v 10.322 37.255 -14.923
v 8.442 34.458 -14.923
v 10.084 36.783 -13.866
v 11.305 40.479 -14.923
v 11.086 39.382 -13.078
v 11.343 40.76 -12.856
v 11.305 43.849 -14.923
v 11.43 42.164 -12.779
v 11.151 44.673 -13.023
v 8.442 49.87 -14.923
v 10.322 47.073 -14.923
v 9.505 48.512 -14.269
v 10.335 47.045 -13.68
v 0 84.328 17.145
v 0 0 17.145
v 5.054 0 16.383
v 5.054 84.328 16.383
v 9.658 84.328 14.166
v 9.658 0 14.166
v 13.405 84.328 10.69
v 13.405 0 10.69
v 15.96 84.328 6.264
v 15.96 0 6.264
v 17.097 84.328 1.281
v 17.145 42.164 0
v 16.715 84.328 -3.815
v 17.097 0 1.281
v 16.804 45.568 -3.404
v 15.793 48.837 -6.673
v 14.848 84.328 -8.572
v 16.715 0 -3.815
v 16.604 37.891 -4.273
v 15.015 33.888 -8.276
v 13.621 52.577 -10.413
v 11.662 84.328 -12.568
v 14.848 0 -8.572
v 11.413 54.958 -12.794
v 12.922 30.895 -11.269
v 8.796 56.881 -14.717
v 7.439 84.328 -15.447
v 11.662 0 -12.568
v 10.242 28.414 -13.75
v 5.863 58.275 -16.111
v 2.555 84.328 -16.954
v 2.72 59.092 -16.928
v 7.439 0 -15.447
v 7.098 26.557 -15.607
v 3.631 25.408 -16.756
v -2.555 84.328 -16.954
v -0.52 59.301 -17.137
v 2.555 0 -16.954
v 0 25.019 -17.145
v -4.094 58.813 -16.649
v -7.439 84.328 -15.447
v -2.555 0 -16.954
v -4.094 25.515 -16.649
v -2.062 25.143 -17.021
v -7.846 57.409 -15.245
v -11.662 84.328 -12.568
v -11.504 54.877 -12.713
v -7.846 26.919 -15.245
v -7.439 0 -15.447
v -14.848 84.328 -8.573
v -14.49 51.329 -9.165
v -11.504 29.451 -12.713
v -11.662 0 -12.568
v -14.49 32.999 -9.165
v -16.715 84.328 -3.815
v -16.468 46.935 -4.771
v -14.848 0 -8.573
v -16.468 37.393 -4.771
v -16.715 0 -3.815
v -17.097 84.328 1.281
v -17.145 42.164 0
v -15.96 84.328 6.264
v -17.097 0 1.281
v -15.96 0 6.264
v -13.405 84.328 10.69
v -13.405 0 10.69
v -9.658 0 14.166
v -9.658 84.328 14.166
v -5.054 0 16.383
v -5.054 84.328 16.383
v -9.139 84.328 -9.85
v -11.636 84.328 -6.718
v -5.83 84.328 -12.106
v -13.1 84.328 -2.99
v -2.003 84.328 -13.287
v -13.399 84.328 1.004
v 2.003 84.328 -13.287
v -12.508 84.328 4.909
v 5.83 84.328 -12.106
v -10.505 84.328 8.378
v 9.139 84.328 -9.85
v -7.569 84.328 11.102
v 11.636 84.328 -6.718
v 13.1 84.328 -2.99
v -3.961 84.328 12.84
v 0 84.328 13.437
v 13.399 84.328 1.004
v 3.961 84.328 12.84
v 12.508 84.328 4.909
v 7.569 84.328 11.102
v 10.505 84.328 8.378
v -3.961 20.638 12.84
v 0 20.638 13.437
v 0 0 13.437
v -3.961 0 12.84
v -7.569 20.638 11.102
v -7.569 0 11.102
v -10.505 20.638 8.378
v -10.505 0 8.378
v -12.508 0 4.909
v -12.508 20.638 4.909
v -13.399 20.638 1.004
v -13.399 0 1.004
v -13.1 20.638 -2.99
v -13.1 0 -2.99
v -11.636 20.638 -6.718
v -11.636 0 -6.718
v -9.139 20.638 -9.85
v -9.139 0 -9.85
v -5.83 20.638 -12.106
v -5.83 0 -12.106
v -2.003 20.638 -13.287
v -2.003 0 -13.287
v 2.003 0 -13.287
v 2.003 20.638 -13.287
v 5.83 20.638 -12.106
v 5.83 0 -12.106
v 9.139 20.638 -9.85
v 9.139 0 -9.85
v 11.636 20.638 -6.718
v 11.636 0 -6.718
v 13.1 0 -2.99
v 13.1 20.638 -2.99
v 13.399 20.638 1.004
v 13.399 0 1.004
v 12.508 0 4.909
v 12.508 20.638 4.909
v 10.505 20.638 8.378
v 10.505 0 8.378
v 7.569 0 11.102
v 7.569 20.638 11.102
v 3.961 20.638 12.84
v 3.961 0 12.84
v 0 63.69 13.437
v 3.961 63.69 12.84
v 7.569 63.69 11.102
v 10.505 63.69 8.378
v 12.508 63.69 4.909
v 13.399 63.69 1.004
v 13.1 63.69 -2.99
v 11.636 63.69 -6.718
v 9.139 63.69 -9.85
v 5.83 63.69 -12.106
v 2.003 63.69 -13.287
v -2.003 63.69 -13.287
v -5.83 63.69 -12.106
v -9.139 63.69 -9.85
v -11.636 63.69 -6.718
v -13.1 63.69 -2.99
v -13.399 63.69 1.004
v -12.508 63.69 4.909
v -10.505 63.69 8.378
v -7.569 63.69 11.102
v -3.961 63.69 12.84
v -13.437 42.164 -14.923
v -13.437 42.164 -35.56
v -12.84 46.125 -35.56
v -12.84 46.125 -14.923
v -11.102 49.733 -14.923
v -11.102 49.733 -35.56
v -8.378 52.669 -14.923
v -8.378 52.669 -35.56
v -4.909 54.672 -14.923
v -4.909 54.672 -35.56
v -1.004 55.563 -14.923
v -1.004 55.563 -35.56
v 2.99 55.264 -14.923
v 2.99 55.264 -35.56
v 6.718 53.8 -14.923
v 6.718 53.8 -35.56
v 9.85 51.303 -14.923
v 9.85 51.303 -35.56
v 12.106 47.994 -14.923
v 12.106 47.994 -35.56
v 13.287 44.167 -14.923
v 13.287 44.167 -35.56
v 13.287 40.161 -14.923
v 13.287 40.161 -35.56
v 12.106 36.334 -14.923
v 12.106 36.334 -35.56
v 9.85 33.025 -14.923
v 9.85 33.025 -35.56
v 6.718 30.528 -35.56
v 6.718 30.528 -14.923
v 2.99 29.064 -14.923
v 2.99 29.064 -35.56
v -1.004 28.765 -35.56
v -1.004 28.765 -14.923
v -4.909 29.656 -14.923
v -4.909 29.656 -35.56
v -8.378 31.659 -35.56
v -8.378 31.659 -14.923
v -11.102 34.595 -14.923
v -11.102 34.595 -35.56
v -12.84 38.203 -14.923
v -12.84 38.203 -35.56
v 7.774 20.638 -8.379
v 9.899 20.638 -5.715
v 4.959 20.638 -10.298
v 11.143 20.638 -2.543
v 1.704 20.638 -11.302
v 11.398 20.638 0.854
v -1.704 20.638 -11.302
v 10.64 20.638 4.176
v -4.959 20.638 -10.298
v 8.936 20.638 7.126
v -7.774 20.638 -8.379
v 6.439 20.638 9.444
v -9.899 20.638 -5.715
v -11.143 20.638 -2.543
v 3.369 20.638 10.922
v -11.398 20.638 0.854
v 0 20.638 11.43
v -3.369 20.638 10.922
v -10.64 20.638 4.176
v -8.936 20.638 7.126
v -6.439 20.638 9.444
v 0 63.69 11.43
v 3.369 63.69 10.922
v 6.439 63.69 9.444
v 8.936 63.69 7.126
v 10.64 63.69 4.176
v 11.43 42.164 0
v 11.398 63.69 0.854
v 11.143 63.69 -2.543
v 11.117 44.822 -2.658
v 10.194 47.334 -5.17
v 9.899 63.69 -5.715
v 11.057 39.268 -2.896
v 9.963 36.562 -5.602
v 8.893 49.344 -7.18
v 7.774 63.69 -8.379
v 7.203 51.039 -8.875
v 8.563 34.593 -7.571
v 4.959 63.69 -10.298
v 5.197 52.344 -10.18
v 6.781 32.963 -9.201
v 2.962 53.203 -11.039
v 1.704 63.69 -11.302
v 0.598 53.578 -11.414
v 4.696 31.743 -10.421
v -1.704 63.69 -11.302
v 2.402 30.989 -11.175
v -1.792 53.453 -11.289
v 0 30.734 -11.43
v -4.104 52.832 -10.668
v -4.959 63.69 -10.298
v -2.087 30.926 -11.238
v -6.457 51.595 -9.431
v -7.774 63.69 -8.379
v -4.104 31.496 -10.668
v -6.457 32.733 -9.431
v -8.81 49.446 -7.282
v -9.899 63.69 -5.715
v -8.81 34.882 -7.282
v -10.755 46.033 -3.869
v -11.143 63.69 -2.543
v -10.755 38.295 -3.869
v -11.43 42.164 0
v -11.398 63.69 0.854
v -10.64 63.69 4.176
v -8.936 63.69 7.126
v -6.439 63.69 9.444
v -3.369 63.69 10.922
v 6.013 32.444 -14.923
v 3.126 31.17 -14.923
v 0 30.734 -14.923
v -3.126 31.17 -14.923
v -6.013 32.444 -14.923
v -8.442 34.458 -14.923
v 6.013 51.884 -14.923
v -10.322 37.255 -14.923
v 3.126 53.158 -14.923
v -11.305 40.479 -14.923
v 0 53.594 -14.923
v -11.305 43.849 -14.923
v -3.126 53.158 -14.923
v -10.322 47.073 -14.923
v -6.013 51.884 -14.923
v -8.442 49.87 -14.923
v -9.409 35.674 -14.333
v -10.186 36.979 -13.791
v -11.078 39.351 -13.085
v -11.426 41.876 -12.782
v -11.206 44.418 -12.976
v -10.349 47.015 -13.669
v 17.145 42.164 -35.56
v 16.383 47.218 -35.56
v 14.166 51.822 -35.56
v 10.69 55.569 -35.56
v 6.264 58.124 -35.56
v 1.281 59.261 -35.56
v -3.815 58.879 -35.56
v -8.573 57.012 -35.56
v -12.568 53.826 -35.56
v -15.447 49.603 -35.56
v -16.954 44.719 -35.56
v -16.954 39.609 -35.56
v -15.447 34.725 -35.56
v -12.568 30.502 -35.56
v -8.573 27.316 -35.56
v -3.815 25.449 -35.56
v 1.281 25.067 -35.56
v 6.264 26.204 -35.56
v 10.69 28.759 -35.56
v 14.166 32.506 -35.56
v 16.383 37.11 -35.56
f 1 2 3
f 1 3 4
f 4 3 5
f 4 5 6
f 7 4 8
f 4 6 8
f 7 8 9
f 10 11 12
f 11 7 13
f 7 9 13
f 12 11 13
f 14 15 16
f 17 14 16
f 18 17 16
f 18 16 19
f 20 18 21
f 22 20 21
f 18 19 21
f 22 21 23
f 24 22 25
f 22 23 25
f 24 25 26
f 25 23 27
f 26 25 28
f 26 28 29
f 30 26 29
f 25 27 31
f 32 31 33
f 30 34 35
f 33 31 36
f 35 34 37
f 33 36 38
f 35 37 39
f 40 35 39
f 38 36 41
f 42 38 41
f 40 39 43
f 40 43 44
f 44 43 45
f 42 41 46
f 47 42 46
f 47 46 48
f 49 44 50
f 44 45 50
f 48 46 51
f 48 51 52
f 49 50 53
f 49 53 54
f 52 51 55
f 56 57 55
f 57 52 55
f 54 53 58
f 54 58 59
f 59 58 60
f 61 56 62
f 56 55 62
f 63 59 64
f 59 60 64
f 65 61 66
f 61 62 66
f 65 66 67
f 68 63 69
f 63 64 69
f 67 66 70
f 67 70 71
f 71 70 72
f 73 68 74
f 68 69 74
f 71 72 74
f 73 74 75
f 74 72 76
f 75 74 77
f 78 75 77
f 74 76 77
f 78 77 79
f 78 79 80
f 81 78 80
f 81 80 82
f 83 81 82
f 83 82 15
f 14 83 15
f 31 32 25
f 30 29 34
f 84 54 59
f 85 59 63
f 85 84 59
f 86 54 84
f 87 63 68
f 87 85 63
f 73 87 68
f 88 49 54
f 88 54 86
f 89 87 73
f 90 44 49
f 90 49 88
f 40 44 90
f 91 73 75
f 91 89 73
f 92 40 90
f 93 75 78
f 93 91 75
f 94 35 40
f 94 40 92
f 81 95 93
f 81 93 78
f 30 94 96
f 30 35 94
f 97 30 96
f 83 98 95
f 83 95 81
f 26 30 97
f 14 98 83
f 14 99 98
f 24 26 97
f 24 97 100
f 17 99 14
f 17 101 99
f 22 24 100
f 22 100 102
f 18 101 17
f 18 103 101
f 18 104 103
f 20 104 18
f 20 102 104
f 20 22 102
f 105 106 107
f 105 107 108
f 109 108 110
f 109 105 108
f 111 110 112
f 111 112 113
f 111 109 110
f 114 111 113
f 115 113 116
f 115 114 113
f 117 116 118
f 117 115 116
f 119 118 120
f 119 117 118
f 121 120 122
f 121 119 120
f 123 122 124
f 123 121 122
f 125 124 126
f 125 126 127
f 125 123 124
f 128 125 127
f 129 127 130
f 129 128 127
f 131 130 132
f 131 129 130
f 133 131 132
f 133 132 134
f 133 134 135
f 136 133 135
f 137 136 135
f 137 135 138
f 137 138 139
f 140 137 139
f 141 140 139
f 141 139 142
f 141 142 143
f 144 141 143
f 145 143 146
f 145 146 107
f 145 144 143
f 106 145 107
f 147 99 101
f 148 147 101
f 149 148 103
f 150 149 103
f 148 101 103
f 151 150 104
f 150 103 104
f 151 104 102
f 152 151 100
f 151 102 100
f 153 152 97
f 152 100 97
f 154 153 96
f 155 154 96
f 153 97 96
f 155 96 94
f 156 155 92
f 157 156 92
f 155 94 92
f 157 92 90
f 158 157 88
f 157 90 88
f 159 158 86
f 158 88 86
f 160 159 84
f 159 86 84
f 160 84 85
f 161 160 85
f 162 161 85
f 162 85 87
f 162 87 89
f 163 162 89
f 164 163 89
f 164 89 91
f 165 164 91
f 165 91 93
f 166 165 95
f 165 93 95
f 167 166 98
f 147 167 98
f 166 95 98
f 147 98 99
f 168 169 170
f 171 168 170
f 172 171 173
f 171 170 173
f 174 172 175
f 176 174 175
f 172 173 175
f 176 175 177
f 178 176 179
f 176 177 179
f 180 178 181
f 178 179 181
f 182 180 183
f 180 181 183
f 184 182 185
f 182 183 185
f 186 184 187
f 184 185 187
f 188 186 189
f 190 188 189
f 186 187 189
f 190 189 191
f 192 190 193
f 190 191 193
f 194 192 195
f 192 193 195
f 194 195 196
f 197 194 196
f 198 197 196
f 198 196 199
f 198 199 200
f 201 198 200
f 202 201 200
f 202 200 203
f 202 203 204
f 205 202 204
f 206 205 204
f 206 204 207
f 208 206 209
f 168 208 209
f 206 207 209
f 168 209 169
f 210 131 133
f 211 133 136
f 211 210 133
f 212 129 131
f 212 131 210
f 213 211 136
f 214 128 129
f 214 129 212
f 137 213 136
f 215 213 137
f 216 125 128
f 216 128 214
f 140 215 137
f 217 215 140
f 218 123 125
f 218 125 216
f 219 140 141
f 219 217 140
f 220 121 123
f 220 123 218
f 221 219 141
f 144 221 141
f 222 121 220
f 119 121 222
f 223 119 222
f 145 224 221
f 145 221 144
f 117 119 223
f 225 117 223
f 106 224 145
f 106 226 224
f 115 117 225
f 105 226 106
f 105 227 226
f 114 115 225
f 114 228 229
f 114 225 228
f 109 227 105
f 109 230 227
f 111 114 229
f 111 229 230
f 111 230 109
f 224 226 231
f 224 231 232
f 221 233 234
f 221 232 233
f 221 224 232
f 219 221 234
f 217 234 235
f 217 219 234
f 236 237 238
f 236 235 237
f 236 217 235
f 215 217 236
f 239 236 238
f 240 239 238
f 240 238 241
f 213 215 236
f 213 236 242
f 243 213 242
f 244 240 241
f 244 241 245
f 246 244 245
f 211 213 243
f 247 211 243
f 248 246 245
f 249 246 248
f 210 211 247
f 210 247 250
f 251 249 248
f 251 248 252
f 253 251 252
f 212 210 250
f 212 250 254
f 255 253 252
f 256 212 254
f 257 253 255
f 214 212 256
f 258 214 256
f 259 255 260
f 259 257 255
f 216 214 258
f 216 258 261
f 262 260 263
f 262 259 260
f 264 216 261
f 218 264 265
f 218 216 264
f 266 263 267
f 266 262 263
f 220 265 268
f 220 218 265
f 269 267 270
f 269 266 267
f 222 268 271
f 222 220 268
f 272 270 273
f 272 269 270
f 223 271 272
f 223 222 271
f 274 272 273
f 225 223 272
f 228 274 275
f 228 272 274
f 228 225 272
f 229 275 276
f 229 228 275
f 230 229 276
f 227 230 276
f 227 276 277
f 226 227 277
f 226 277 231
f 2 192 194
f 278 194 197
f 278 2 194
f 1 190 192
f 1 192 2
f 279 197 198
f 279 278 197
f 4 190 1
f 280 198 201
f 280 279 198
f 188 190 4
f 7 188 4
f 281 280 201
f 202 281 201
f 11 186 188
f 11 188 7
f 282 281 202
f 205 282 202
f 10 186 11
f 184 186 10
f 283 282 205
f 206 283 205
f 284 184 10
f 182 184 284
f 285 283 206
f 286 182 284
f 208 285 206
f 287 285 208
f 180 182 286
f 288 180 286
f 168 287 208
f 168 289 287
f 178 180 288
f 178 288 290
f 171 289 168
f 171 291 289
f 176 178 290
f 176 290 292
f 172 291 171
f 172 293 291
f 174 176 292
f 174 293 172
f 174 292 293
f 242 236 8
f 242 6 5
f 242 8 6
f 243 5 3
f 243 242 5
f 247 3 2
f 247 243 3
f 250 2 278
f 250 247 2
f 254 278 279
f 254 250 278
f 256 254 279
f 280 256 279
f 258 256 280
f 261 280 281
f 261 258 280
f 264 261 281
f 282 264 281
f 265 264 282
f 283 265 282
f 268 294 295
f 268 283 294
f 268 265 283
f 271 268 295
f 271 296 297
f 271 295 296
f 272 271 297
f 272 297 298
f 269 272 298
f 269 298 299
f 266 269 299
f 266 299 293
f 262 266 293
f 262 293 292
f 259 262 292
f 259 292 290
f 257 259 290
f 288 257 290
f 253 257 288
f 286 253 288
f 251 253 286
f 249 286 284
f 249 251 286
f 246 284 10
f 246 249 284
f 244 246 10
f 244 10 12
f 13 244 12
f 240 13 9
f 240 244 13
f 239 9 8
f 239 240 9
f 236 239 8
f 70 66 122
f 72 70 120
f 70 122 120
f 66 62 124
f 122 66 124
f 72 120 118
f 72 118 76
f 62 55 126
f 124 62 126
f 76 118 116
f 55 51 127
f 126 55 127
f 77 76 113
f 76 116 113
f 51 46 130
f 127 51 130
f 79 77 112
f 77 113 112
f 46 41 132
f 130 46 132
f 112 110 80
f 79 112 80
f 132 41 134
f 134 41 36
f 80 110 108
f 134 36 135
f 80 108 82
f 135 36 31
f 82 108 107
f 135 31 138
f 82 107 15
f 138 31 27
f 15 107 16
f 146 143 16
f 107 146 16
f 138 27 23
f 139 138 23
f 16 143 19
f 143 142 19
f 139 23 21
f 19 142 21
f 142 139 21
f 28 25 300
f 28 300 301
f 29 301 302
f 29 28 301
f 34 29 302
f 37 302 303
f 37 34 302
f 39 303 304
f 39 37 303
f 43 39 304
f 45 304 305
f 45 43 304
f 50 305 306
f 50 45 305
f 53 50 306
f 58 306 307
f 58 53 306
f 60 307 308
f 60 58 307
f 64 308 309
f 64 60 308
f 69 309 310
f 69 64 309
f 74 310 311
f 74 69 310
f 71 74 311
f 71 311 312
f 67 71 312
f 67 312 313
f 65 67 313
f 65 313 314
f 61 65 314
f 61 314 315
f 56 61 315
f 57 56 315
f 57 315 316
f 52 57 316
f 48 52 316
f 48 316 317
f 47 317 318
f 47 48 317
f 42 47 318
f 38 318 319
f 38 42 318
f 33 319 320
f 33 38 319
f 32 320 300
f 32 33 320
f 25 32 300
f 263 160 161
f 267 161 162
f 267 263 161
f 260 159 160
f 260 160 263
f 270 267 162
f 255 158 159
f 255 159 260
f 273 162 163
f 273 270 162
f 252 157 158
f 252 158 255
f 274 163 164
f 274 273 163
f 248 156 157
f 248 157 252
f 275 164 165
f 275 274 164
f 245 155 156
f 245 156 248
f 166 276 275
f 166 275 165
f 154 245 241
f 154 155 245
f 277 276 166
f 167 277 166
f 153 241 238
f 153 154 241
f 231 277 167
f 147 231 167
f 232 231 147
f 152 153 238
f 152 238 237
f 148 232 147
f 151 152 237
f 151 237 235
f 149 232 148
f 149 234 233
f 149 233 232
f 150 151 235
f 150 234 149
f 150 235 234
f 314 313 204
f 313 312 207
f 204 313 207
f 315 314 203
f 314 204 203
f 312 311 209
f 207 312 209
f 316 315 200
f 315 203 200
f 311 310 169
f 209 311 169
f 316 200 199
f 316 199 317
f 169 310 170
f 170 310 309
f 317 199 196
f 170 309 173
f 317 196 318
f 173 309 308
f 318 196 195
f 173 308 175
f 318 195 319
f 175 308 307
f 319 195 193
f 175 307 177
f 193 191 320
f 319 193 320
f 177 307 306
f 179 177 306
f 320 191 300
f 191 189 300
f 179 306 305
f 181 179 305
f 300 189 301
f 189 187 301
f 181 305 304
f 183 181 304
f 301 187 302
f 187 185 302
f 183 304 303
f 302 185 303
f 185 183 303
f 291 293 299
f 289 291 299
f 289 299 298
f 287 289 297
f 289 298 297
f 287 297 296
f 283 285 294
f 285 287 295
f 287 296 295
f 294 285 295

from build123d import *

# Parameters (mm, degrees)
SKETCH1_R           = 17.145
SKETCH1_R_2         = 11.43
BOSS_EXTRUDE1_DEPTH = 84.328
SKETCH2_R           = 17.145
SKETCH2_R_2         = 11.43
BOSS_EXTRUDE2_DEPTH = 35.56
SKETCH3_R           = 11.43
CUT_EXTRUDE1_DEPTH  = 94.111096186
CUT_EXTRUDE2_START  = -35.56
SKETCH4_R           = 11.43
CUT_EXTRUDE2_DEPTH  = 35.56
SKETCH5_R           = 13.4366
CUT_EXTRUDE3_DEPTH  = 20.6375
CUT_EXTRUDE4_START  = -20.6375
SKETCH6_R           = 13.4366
CUT_EXTRUDE4_DEPTH  = 20.6375
SKETCH7_R           = 13.4366
CUT_EXTRUDE5_DEPTH  = 20.6375


with BuildPart() as part:
    # Sketch1 → Boss-Extrude1 (new body)
    with BuildSketch(Plane(origin=(0, 0, 0), x_dir=(1, 0, 0), z_dir=(0, 1, 0))):
        with Locations(Location((0, 0, 0), (0, 0, 270))):
            Circle(SKETCH1_R)
        with Locations(Location((0, 0, 0), (0, 0, 270))):
            Circle(SKETCH1_R_2, mode=Mode.SUBTRACT)
    extrude(amount=BOSS_EXTRUDE1_DEPTH)

    # Sketch2 → Boss-Extrude2 (add)
    with BuildSketch(Plane.XY):
        with Locations((0, 42.164)):
            Circle(SKETCH2_R)
        with Locations((0, 42.164)):
            Circle(SKETCH2_R_2, mode=Mode.SUBTRACT)
    extrude(amount=-BOSS_EXTRUDE2_DEPTH)

    # Sketch3 → Cut-Extrude1 (cut, through all)
    with BuildSketch(Plane(origin=(0, 84.328, 0), x_dir=(1, 0, 0), z_dir=(0, 1, 0))):
        with Locations(Location((0, 0, 0), (0, 0, 270))):
            Circle(SKETCH3_R)
    extrude(amount=-CUT_EXTRUDE1_DEPTH, mode=Mode.SUBTRACT)

    # Sketch4 → Cut-Extrude2 (cut)
    with BuildSketch(Plane(origin=(0, 0, -35.56), x_dir=(-1, 0, 0), z_dir=(0, 0, -1)).offset(CUT_EXTRUDE2_START)):
        with Locations(Location((0, 42.164, 0), (0, 0, 180))):
            Circle(SKETCH4_R)
    extrude(amount=CUT_EXTRUDE2_DEPTH, mode=Mode.SUBTRACT)

    # Sketch5 → Cut-Extrude3 (cut)
    with BuildSketch(Plane(origin=(0, 84.328, 0), x_dir=(1, 0, 0), z_dir=(0, 1, 0))):
        with Locations(Location((0, 0, 0), (0, 0, 270))):
            Circle(SKETCH5_R)
    extrude(amount=-CUT_EXTRUDE3_DEPTH, mode=Mode.SUBTRACT)

    # Sketch6 → Cut-Extrude4 (cut)
    with BuildSketch(Plane.XZ.offset(CUT_EXTRUDE4_START)):
        with Locations(Location((0, 0, 0), (0, 0, 90))):
            Circle(SKETCH6_R)
    extrude(amount=CUT_EXTRUDE4_DEPTH, mode=Mode.SUBTRACT)

    # Sketch7 → Cut-Extrude5 (cut)
    with BuildSketch(Plane(origin=(0, 0, -35.56), x_dir=(-1, 0, 0), z_dir=(0, 0, -1))):
        with Locations((0, 42.164)):
            Circle(SKETCH7_R)
    extrude(amount=-CUT_EXTRUDE5_DEPTH, mode=Mode.SUBTRACT)


solid = part.part
